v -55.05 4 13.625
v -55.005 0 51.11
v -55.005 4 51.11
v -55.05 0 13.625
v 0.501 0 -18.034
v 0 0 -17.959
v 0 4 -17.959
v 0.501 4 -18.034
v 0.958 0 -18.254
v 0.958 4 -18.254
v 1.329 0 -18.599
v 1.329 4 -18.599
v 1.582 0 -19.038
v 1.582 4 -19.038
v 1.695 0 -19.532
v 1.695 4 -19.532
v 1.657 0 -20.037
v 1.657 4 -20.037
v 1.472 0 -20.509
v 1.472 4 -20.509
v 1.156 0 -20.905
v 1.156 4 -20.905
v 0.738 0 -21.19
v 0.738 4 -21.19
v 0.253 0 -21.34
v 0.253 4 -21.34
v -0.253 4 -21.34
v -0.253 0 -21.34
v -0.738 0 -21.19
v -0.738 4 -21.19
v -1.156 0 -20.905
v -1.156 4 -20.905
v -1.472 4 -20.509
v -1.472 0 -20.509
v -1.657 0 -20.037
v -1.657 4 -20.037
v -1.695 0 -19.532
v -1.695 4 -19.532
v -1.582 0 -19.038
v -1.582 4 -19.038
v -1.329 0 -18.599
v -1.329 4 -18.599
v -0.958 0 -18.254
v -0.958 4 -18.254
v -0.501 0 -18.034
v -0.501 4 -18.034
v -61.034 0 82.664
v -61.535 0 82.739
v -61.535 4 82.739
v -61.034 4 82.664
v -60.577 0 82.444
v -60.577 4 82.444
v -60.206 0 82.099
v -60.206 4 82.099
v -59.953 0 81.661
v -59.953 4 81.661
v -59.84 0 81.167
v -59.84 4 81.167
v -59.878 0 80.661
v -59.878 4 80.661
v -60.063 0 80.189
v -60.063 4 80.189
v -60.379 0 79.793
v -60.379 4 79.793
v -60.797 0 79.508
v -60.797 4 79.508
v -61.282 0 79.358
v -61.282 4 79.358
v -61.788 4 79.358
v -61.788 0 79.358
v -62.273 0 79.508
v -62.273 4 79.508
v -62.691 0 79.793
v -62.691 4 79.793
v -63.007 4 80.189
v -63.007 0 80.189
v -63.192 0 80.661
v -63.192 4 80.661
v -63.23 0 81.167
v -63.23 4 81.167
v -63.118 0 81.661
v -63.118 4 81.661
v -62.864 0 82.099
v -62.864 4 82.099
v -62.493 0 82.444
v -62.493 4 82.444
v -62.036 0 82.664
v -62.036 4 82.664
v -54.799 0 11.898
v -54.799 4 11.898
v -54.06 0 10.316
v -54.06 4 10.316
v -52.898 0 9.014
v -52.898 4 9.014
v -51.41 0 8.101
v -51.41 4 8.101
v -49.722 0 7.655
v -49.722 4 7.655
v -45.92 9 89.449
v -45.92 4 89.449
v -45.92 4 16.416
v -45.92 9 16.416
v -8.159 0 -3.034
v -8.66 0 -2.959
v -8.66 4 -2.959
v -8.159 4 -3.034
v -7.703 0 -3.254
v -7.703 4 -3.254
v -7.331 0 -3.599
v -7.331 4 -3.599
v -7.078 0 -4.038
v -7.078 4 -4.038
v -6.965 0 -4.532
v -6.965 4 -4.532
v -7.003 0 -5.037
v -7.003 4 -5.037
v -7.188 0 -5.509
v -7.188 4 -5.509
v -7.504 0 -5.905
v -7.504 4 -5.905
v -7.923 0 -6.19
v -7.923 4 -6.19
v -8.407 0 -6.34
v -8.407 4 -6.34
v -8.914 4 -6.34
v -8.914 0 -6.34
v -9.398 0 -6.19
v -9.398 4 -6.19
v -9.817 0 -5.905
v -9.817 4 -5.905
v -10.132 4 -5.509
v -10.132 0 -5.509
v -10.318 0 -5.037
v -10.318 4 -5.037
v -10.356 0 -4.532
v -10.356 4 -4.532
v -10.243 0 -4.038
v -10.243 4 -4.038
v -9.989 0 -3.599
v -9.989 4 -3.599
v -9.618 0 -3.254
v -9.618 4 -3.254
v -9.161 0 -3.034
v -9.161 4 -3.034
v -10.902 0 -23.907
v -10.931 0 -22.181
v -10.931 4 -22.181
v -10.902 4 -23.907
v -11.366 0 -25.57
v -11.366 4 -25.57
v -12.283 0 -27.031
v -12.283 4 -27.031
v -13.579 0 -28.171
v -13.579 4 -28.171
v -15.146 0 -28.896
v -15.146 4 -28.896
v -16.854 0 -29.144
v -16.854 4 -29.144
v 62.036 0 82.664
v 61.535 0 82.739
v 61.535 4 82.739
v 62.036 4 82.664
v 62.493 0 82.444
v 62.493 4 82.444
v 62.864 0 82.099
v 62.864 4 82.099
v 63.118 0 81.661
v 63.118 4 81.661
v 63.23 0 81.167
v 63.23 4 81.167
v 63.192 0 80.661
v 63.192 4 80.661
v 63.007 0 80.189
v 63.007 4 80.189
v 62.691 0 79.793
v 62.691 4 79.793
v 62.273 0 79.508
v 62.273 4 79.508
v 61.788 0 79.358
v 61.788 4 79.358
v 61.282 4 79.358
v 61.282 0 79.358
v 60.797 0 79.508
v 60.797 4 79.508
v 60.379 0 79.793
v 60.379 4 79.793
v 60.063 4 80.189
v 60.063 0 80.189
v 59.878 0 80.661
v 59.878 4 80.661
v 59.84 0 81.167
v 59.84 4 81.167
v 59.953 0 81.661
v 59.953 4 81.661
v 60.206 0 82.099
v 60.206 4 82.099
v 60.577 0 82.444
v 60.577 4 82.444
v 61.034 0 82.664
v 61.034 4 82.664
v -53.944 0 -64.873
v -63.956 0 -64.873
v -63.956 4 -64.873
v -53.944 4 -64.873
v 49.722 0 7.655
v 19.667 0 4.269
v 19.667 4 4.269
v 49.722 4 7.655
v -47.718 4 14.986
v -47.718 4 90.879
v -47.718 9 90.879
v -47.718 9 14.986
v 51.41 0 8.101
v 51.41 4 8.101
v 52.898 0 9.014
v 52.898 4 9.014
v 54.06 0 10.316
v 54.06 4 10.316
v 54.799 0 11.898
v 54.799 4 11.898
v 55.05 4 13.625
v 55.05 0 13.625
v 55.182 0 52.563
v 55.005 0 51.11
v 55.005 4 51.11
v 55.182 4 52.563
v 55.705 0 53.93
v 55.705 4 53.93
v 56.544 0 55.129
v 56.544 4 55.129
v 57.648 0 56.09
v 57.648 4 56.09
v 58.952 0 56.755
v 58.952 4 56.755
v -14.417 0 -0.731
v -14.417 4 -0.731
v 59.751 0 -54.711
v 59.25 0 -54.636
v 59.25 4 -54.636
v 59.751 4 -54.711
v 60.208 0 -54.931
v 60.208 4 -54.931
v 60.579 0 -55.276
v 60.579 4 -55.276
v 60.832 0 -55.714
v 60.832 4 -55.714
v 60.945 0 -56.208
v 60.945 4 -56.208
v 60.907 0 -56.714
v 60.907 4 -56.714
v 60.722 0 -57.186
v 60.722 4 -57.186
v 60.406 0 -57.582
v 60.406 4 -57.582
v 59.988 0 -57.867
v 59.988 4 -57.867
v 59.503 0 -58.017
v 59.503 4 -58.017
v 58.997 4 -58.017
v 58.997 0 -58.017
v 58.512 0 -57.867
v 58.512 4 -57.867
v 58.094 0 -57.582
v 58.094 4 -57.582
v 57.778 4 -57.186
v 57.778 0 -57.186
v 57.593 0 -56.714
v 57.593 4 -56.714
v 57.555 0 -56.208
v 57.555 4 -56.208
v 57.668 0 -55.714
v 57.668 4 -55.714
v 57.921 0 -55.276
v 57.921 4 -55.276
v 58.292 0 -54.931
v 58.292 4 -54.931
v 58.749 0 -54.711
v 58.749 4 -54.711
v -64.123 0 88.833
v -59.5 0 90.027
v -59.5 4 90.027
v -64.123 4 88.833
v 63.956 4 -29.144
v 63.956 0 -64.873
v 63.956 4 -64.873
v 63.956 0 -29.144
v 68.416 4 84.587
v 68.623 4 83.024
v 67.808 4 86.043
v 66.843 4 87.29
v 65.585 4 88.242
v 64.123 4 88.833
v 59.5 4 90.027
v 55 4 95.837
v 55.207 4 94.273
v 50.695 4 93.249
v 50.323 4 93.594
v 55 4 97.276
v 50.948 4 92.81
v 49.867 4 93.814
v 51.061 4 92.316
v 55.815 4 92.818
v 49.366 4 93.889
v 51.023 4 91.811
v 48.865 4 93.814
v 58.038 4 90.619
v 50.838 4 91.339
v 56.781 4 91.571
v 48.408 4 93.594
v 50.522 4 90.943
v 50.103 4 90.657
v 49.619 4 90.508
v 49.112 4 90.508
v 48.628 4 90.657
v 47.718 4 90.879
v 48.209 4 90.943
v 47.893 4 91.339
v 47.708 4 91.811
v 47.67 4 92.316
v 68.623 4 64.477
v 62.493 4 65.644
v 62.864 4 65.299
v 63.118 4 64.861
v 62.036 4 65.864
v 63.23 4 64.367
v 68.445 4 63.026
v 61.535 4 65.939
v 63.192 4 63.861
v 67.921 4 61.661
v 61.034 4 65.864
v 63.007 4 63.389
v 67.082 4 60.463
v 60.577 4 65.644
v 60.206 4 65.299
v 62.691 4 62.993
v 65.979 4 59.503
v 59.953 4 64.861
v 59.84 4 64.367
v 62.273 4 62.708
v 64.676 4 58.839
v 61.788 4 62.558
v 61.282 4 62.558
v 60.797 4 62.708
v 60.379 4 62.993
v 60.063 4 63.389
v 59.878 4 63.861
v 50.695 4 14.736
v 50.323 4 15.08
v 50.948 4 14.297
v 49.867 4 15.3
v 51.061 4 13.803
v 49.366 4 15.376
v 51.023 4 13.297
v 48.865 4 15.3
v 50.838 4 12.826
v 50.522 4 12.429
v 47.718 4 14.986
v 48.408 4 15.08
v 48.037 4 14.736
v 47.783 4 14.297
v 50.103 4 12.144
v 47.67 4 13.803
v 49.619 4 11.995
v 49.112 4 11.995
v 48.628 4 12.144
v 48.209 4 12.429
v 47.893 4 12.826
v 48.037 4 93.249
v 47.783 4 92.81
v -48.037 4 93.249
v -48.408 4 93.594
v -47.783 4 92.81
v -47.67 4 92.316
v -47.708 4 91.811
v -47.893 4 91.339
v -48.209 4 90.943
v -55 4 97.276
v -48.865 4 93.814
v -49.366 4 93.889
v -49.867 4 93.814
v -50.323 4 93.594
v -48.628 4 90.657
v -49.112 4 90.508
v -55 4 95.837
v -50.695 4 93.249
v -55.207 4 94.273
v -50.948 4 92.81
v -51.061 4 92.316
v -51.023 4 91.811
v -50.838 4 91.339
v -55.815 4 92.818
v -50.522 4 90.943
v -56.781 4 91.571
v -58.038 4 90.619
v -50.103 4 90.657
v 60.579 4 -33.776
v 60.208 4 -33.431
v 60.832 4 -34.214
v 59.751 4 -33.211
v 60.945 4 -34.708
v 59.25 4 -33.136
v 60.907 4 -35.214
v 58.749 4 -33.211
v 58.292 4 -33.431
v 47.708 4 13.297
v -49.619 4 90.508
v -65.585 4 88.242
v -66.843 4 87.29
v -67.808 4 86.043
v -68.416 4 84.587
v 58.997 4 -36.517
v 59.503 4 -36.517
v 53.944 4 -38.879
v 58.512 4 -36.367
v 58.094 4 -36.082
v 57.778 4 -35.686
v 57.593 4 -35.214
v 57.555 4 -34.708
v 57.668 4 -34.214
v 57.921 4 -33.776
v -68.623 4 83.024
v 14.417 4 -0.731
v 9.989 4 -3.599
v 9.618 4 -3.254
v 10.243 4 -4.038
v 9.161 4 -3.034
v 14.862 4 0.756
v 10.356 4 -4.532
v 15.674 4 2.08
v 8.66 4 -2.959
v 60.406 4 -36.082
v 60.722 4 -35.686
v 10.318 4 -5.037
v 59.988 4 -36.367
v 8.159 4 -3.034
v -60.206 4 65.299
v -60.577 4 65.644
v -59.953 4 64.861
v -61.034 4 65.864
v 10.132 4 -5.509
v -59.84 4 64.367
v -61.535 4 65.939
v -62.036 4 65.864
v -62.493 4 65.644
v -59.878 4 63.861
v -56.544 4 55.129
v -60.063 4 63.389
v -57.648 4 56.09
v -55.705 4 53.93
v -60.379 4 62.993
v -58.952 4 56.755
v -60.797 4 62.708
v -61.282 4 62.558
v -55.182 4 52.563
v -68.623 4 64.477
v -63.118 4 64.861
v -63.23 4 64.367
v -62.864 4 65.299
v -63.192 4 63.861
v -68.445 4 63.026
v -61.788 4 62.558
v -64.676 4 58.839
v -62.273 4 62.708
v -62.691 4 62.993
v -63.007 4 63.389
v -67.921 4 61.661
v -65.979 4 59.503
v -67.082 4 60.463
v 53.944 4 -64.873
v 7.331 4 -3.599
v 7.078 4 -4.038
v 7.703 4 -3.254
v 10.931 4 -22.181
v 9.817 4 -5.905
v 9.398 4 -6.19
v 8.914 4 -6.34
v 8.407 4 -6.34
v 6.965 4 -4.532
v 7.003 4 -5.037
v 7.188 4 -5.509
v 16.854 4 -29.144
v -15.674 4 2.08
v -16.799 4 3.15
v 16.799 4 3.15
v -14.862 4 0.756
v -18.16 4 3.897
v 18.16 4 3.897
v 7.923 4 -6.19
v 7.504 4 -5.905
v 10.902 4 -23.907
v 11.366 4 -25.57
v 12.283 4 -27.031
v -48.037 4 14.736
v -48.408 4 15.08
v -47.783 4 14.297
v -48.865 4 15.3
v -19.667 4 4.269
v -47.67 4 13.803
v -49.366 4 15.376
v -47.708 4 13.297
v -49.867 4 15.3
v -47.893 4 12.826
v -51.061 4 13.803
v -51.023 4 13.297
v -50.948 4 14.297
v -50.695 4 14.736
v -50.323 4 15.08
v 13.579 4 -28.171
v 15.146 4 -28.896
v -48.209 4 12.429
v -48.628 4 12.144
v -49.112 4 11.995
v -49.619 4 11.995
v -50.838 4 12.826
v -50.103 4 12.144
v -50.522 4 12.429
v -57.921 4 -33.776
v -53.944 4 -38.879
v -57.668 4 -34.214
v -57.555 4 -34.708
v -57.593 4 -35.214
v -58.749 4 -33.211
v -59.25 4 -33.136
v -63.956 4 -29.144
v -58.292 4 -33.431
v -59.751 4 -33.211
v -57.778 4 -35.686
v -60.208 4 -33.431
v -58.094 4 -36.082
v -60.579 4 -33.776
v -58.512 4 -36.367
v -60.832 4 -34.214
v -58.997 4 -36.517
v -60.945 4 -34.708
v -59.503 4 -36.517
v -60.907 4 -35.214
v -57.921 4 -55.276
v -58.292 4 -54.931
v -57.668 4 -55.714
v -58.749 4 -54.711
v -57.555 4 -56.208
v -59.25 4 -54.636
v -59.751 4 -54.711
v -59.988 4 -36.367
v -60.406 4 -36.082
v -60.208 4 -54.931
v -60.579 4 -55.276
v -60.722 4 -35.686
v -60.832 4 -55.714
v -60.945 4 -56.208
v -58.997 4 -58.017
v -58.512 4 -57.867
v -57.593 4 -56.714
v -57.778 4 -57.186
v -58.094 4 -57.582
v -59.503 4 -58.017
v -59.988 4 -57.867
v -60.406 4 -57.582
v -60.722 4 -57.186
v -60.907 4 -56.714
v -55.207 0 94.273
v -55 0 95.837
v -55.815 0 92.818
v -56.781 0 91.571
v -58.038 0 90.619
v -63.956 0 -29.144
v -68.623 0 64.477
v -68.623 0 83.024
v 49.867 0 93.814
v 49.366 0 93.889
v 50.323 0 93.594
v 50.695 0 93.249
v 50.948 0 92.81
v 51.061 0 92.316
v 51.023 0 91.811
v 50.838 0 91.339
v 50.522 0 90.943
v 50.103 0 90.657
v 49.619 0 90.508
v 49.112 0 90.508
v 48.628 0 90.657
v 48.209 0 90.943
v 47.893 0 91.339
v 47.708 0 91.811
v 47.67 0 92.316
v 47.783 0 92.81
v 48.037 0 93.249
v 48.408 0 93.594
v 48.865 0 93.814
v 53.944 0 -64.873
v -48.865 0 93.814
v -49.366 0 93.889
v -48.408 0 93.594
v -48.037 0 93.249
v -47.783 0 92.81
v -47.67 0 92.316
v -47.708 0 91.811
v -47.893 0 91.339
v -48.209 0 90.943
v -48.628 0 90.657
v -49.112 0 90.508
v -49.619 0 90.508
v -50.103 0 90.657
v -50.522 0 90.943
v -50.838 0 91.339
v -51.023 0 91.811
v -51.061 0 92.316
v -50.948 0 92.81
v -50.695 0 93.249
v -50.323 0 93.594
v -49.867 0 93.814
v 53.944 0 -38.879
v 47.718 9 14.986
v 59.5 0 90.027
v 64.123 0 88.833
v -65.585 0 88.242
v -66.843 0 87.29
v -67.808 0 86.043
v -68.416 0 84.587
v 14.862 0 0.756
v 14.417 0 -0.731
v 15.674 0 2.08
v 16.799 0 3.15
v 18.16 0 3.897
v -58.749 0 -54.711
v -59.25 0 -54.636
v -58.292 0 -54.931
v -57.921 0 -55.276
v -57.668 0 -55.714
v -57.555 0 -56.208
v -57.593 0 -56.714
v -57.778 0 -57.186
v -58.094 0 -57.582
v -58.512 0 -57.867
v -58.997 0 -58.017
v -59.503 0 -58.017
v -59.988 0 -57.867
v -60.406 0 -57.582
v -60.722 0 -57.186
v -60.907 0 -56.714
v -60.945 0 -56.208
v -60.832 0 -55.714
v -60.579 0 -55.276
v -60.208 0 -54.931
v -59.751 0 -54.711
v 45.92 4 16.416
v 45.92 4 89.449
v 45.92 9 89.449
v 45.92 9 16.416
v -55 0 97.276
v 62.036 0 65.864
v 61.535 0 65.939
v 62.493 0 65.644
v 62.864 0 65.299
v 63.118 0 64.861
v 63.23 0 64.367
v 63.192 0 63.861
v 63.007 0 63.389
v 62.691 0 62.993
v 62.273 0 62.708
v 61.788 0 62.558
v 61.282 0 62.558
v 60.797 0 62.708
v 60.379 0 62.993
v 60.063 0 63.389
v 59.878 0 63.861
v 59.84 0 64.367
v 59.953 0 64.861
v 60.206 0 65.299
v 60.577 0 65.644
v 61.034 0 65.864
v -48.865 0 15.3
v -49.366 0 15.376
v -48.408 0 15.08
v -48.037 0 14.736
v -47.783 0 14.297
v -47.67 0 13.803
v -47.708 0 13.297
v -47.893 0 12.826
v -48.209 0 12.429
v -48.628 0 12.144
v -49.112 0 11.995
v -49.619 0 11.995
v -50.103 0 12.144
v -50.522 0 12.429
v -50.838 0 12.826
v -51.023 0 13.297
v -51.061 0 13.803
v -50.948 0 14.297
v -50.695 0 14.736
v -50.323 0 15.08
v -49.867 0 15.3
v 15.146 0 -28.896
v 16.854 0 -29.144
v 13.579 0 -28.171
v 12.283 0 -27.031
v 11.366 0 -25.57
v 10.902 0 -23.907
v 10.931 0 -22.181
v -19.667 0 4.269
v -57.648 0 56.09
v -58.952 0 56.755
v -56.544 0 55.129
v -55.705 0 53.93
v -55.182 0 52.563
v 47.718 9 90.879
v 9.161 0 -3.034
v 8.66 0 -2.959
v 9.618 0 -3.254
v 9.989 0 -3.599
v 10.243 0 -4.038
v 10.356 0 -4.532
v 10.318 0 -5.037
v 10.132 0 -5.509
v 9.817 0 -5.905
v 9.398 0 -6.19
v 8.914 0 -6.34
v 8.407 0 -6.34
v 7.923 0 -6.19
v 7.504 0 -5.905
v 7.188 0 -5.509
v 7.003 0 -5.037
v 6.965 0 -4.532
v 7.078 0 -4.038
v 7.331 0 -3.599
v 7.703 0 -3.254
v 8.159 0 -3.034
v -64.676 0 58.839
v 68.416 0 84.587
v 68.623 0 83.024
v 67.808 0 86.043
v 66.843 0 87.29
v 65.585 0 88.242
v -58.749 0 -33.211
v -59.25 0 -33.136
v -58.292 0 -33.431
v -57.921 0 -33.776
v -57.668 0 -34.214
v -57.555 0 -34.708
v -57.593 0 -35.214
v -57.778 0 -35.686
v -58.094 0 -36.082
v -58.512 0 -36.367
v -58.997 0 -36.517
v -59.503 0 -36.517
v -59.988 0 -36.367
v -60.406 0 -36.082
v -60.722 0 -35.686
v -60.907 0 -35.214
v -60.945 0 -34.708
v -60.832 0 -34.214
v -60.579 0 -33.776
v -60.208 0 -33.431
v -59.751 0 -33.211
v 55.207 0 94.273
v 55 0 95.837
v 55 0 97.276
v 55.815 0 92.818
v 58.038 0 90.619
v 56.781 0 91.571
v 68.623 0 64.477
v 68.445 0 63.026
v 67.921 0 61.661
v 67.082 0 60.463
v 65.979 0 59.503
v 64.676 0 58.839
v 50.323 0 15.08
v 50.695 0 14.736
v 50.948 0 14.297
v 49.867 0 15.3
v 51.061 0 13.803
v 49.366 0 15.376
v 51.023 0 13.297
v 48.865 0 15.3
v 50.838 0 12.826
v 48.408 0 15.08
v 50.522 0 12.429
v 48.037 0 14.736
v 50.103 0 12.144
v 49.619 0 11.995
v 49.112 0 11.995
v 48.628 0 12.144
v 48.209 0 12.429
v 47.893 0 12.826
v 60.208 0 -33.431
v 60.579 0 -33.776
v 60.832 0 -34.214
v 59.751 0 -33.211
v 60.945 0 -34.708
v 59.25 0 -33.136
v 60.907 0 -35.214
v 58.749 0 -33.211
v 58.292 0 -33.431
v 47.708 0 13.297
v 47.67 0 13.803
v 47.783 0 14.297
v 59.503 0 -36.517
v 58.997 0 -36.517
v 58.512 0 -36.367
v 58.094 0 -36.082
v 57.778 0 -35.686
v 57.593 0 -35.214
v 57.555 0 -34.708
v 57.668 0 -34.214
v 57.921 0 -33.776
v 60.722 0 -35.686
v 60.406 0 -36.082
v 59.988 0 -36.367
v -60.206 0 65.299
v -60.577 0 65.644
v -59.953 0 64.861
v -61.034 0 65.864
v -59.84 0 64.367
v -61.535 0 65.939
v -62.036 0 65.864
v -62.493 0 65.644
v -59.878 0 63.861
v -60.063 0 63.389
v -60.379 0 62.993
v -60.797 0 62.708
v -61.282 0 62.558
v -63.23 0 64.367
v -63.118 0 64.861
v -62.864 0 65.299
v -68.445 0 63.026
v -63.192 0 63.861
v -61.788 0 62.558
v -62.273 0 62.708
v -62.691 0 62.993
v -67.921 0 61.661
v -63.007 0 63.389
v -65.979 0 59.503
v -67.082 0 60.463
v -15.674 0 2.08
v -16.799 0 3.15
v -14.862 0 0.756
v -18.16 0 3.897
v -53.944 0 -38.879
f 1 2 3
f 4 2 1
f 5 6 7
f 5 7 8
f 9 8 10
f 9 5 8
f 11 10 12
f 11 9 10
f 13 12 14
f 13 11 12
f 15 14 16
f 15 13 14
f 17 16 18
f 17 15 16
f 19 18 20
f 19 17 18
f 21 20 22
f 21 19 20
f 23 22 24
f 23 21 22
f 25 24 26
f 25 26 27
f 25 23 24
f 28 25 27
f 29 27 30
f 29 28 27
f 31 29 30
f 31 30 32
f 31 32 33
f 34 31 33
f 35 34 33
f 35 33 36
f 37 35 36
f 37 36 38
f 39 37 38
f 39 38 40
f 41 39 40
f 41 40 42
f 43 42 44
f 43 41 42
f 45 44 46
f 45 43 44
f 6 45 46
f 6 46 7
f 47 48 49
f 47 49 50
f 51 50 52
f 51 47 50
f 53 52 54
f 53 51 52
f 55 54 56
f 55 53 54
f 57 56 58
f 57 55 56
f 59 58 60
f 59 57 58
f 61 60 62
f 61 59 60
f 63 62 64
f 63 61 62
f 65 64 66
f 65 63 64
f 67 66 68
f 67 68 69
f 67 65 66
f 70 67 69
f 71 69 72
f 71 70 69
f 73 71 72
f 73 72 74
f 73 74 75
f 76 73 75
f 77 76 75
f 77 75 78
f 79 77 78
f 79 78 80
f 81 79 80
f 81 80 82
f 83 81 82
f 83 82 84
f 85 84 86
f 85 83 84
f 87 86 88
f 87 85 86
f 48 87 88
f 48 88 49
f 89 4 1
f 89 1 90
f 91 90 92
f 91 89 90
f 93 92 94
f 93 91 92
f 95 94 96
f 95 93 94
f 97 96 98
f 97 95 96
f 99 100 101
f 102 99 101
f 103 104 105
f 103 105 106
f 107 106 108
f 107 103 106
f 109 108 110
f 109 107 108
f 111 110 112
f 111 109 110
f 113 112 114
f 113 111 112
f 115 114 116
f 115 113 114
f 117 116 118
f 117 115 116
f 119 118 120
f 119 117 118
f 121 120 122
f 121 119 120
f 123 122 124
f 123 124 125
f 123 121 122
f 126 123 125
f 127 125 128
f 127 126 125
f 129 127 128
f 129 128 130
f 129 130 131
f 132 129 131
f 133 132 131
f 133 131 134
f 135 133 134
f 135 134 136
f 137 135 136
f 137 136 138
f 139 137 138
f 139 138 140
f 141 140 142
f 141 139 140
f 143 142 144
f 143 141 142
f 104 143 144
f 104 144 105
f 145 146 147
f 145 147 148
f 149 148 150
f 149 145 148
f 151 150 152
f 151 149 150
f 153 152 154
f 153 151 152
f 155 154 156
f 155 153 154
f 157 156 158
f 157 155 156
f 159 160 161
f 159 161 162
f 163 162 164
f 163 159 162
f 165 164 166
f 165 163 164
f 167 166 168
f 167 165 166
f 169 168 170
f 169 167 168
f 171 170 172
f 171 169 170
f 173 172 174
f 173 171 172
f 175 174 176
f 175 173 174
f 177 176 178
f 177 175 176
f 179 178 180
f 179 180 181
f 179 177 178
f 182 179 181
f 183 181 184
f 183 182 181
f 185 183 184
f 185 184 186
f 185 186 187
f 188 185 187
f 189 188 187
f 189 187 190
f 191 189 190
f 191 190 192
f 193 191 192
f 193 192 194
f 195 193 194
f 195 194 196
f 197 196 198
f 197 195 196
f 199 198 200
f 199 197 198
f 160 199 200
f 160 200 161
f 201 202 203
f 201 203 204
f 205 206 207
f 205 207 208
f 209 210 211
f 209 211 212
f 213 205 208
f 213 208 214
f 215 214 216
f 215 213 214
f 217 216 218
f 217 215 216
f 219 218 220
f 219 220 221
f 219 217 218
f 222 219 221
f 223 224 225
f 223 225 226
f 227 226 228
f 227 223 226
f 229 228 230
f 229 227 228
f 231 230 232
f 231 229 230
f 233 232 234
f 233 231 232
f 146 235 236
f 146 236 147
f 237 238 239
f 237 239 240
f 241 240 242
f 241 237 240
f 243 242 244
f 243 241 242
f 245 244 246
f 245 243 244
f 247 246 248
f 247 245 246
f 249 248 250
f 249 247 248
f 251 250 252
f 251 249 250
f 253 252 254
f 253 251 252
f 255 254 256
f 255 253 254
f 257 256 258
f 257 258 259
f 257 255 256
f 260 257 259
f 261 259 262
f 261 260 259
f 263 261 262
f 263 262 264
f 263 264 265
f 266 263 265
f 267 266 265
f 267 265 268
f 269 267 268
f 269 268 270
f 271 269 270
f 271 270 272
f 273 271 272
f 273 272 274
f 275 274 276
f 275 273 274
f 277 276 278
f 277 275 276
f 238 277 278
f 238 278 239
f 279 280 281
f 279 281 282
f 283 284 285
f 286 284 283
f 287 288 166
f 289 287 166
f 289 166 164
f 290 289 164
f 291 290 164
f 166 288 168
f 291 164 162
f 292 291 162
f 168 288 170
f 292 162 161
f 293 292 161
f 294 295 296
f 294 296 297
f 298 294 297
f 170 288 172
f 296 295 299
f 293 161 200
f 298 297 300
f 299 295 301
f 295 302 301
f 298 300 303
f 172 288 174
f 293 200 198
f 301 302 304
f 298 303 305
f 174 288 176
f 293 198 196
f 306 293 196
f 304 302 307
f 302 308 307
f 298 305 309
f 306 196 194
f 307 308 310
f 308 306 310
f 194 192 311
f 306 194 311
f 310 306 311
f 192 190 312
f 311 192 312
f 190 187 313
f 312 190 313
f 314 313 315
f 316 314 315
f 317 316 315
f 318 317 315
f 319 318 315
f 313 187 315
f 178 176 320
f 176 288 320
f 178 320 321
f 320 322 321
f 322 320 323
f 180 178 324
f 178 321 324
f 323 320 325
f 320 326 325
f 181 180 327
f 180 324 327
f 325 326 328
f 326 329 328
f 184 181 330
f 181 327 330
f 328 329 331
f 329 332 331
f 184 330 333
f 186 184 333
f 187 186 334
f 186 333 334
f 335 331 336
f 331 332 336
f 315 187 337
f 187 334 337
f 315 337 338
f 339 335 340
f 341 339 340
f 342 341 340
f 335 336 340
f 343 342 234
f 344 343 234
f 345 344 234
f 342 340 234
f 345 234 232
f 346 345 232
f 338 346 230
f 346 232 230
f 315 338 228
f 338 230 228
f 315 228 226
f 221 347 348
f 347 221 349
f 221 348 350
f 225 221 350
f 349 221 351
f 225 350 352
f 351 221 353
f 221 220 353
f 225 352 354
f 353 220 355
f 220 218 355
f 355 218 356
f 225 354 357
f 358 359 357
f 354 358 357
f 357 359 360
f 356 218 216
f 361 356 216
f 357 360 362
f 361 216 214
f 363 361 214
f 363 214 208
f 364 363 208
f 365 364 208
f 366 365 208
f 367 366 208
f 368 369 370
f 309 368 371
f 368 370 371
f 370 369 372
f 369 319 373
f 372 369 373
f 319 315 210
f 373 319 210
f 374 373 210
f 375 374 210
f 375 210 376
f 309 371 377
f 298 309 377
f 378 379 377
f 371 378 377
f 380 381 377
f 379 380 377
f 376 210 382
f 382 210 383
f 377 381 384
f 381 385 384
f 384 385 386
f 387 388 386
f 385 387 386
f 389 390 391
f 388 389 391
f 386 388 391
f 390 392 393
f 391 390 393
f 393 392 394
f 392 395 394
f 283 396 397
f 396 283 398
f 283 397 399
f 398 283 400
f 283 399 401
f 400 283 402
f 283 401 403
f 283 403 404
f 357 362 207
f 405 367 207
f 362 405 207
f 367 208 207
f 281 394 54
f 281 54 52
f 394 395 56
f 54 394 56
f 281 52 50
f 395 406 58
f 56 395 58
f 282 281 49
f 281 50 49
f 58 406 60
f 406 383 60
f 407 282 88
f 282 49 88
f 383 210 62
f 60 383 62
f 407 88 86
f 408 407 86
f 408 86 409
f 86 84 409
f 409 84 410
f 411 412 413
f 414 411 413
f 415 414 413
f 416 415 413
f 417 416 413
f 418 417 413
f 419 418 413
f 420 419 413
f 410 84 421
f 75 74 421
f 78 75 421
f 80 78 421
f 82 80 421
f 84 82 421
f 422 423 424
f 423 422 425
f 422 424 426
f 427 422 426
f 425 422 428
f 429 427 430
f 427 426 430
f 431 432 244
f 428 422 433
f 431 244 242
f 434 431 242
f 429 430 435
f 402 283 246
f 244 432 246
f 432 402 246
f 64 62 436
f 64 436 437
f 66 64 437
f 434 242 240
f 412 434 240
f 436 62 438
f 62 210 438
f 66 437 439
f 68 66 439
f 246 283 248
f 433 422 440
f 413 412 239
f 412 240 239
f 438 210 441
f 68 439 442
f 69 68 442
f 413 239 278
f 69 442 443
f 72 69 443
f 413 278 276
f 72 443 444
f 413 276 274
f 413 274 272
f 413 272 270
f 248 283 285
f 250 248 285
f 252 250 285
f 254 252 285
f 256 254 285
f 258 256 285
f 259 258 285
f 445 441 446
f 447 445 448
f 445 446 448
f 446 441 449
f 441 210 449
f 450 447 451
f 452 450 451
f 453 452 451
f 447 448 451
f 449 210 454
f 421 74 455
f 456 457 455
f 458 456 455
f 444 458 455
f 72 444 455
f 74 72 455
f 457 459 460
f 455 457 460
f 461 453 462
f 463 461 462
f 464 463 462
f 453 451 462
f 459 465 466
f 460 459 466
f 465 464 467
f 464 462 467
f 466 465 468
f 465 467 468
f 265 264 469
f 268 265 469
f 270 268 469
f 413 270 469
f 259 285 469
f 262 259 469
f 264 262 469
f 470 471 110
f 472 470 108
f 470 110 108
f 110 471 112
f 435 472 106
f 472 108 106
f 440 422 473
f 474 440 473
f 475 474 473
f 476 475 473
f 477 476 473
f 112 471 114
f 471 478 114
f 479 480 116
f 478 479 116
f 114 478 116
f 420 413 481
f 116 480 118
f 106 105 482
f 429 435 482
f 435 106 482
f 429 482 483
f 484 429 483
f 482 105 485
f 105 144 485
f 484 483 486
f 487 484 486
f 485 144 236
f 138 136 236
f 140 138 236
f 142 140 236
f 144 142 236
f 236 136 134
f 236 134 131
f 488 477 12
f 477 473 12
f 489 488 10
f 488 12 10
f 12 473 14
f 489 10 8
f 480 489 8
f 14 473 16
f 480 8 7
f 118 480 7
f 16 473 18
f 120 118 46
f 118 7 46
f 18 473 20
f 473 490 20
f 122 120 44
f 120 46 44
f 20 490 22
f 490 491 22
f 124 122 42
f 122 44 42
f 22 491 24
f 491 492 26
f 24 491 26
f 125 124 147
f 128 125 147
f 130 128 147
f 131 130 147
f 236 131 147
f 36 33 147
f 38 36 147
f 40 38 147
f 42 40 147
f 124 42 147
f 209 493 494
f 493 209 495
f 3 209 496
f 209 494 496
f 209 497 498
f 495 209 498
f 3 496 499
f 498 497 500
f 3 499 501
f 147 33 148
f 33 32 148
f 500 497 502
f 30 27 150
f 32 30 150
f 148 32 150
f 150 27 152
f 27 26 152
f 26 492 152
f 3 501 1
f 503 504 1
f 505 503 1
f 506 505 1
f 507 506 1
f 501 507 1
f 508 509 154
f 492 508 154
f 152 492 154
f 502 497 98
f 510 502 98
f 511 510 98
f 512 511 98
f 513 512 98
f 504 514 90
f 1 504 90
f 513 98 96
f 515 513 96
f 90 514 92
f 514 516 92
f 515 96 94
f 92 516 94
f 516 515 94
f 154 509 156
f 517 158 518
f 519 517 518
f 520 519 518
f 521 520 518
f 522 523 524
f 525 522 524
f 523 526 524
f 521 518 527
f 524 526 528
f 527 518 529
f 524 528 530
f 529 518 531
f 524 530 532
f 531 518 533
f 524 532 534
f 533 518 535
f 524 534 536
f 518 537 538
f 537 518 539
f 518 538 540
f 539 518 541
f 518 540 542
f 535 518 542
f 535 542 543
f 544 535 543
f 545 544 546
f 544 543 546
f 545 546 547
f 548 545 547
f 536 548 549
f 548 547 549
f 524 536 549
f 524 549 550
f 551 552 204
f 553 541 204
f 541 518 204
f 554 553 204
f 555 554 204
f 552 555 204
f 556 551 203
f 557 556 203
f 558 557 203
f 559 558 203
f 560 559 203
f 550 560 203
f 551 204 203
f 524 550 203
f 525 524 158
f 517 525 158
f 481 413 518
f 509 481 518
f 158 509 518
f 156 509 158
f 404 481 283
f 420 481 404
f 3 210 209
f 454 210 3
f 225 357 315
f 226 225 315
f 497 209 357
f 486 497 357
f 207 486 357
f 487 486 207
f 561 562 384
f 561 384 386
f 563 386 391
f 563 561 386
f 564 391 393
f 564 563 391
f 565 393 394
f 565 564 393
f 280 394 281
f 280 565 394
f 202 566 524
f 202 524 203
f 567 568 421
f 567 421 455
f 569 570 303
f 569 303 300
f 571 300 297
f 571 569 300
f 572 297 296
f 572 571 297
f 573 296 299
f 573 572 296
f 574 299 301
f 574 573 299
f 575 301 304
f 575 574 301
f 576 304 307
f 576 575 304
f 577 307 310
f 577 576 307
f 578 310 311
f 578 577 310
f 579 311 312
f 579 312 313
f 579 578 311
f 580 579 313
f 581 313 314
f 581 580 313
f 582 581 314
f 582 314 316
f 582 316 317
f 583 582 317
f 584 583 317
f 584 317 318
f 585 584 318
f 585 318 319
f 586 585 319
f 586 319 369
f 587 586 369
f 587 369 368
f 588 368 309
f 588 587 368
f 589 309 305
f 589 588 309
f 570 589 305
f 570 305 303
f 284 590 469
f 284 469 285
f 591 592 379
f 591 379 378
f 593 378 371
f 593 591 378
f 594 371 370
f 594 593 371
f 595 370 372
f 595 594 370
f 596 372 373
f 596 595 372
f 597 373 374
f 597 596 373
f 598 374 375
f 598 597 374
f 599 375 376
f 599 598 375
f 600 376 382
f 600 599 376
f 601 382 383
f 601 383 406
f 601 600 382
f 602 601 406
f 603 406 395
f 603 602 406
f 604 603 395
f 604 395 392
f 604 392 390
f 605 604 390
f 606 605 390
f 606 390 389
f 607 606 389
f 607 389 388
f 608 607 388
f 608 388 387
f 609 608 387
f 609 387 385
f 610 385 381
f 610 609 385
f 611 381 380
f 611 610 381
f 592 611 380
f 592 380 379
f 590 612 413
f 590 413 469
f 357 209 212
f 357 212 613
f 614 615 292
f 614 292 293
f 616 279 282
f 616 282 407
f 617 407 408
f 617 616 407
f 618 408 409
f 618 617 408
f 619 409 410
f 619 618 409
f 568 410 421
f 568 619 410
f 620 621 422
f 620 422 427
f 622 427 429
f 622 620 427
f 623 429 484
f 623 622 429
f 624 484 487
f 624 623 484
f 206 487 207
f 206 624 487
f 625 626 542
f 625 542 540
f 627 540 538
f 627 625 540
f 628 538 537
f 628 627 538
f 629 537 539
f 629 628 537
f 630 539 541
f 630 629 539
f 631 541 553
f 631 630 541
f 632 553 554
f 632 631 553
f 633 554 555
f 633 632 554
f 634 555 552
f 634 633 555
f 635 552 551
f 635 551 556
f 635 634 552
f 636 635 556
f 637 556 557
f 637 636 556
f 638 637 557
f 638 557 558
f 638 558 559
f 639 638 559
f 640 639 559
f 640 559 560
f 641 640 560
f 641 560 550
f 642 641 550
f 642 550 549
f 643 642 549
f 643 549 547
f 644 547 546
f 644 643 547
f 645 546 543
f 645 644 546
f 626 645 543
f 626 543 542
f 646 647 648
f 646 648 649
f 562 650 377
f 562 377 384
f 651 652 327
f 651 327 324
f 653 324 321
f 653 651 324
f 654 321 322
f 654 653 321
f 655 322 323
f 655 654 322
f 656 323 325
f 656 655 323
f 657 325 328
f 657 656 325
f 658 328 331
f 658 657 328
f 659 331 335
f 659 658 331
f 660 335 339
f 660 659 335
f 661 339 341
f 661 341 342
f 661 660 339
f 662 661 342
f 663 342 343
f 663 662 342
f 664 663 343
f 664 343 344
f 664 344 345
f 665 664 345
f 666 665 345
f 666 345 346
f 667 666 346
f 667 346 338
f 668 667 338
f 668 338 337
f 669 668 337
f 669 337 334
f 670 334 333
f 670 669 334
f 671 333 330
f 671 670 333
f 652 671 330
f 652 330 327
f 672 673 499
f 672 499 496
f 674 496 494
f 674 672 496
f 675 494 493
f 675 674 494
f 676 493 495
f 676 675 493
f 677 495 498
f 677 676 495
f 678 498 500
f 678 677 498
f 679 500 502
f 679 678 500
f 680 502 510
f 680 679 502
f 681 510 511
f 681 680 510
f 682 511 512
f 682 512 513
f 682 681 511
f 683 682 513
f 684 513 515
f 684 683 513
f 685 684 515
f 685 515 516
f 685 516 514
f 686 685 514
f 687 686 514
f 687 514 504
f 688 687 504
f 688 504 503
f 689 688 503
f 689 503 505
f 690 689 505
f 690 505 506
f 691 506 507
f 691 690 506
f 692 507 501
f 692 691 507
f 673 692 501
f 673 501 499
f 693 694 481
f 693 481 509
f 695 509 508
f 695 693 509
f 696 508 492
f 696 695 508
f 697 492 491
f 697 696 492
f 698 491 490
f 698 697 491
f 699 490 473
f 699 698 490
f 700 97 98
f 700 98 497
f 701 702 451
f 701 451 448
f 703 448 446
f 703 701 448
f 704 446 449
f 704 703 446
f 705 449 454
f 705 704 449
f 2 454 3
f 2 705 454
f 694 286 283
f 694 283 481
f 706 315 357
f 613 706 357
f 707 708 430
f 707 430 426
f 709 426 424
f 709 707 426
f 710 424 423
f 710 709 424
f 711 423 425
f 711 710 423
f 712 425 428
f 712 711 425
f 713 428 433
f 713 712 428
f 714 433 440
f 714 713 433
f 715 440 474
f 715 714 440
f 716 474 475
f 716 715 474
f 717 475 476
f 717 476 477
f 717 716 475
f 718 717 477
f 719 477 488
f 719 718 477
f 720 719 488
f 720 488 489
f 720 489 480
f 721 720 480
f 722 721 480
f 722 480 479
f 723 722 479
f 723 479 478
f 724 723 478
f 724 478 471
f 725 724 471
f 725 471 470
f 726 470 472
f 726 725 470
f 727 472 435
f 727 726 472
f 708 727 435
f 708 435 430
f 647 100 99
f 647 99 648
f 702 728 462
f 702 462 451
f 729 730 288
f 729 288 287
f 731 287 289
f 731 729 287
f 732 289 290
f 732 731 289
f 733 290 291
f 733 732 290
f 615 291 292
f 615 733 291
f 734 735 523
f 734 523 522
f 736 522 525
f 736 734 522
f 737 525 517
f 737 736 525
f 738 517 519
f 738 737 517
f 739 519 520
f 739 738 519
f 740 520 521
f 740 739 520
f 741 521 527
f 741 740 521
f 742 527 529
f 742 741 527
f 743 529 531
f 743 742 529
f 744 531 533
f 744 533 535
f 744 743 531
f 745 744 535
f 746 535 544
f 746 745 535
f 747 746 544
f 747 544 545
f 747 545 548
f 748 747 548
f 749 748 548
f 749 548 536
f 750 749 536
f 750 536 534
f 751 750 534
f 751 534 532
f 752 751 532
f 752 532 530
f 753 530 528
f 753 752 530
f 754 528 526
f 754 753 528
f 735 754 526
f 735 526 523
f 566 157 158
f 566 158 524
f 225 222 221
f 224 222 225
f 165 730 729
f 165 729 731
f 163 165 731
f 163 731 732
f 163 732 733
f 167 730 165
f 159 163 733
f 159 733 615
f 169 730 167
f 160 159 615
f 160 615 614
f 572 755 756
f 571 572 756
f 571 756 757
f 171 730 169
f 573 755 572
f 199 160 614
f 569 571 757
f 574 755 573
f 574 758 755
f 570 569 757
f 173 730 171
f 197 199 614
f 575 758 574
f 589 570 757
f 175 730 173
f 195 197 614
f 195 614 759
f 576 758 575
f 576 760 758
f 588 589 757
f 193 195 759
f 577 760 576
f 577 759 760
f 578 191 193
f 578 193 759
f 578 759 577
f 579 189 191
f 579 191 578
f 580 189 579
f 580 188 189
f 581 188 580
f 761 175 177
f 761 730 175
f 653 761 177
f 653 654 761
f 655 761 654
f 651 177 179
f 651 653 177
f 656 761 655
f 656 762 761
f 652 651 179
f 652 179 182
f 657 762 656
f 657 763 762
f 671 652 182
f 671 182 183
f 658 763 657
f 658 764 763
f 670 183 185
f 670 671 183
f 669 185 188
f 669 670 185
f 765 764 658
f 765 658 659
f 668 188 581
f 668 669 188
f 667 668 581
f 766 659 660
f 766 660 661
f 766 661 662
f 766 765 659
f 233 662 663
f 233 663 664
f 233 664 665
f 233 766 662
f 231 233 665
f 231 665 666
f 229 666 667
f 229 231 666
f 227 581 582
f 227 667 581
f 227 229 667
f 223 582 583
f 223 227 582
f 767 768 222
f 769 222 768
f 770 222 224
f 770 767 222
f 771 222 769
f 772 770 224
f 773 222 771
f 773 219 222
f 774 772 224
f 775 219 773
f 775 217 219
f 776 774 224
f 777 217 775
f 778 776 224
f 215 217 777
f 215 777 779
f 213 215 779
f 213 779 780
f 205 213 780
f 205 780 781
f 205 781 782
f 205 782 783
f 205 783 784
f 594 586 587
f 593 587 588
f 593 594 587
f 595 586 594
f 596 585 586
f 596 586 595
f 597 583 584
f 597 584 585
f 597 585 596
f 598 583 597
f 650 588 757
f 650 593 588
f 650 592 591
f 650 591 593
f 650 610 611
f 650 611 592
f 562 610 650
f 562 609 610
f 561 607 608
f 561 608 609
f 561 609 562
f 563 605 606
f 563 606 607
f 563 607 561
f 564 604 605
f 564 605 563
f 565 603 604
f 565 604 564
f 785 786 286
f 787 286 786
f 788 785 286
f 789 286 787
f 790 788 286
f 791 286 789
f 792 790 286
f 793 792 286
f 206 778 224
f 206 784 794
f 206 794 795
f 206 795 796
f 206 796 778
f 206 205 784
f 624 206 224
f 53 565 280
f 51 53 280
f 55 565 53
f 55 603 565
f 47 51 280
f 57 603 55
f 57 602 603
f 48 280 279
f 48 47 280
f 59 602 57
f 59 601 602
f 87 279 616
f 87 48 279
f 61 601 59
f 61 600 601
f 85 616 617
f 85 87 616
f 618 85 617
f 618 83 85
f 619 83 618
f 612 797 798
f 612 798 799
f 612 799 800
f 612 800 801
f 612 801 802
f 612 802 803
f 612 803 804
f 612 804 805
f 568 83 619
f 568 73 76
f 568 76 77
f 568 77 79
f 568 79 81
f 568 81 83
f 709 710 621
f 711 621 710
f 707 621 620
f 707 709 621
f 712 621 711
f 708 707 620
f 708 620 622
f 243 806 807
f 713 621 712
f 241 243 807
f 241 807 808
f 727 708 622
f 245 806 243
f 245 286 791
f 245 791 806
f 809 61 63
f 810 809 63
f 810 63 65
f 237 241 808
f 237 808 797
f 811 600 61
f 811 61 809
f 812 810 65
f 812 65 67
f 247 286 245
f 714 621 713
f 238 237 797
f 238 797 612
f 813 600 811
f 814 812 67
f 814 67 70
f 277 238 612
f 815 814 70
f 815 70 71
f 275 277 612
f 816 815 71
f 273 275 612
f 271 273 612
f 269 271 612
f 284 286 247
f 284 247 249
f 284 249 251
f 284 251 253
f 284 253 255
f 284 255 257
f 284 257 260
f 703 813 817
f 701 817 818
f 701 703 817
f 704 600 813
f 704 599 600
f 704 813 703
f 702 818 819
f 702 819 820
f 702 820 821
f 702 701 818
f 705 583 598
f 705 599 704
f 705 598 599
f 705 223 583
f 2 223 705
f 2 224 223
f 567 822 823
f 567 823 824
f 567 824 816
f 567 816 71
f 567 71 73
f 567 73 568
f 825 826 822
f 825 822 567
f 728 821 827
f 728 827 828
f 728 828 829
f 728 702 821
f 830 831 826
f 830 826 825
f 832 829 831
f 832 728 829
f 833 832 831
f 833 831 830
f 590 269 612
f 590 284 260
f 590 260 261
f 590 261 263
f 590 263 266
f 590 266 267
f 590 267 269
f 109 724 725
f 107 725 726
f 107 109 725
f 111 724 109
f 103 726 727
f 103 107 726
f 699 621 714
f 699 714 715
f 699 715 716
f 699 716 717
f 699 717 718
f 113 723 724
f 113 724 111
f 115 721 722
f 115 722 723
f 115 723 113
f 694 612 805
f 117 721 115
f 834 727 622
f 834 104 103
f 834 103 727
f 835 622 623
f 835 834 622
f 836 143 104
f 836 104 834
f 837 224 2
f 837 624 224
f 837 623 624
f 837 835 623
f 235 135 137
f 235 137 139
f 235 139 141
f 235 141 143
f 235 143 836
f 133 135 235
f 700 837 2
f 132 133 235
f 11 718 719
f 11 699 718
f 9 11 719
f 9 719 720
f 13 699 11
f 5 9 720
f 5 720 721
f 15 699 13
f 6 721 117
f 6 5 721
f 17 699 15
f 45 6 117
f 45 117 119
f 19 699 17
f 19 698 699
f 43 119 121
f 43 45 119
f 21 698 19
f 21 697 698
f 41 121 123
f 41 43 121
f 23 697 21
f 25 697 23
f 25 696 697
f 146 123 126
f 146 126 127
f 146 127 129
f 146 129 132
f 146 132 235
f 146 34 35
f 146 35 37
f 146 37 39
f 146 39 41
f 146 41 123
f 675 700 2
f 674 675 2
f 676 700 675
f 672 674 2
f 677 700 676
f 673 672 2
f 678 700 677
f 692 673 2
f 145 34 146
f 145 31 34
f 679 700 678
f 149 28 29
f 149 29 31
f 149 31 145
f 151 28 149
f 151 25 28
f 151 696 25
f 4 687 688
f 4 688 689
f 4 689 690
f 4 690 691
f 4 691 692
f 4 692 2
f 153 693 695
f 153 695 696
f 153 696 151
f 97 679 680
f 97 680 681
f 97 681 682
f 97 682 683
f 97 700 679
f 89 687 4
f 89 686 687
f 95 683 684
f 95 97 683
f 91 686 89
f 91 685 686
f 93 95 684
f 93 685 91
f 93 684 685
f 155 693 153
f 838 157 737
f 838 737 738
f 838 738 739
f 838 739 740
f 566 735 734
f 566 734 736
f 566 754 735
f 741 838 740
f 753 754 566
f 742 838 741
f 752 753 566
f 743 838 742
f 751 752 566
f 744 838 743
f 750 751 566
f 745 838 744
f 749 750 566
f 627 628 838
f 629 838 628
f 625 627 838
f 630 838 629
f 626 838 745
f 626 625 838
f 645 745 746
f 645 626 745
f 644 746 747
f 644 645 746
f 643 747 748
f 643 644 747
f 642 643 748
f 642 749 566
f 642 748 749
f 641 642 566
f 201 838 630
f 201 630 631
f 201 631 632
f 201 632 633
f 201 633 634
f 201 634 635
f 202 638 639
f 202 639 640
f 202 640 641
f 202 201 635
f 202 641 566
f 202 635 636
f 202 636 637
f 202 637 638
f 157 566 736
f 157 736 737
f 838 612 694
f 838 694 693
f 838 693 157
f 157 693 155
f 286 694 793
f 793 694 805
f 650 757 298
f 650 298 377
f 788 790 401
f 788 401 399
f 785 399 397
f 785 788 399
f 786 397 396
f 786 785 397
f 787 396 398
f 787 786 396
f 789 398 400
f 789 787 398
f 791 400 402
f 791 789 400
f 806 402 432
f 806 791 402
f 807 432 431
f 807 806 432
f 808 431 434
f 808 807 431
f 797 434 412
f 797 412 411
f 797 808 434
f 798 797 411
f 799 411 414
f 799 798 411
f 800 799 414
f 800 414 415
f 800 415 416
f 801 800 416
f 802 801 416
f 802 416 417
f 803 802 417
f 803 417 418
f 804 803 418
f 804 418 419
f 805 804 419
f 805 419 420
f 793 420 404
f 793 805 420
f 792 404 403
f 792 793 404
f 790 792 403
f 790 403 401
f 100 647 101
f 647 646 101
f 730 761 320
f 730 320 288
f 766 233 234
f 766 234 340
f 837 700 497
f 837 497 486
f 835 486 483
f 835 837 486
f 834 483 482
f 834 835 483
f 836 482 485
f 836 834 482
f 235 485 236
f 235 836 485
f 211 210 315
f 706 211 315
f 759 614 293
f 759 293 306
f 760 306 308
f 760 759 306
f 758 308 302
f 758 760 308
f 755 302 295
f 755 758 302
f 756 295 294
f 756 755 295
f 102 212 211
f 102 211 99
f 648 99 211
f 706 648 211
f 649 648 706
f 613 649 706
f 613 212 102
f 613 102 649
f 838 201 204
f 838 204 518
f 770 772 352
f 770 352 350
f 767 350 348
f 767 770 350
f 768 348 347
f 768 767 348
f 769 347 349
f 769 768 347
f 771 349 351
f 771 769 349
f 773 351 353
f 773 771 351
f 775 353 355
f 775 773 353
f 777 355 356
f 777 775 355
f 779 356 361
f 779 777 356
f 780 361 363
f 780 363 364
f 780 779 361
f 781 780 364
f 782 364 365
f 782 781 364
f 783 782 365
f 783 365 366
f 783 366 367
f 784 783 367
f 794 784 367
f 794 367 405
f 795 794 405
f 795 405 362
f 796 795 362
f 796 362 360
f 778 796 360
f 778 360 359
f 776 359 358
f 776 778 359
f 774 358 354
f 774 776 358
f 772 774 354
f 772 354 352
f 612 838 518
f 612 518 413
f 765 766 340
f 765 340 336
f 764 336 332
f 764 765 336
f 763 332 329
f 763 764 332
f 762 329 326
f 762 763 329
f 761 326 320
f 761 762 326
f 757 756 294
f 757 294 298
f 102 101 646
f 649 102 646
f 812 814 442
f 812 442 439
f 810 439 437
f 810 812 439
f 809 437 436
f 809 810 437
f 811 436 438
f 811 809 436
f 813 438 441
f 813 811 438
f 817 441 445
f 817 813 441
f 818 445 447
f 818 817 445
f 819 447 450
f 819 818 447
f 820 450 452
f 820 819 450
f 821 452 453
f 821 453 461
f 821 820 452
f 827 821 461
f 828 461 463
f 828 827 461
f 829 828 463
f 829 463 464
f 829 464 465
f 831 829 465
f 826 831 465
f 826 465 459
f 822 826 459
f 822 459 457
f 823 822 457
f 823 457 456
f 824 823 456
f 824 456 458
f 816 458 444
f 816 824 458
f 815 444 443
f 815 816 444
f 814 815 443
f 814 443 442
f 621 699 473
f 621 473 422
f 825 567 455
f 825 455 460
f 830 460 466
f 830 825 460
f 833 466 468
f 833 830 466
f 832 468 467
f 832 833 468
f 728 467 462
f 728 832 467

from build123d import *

# Parameters (mm, degrees)
SKETCH1_R           = 1.7
BOSS_EXTRUDE2_DEPTH = 4
SKETCH4_W           = 95.436014614
SKETCH4_H           = 75.892817578
SKETCH4_W_2         = 91.839367952
SKETCH4_H_2         = 73.032685056
BOSS_EXTRUDE5_DEPTH = 5


with BuildPart() as part:
    # Sketch1 → Boss-Extrude2 (new body)
    with BuildSketch(Plane(origin=(0, 0, 0), x_dir=(1, 0, 0), z_dir=(0, 1, 0))):
        with BuildLine():
            Line((55, -97.276480298), (-55, -97.276480298))
            Line((-55, -97.276480298), (-55, -95.836582418))
            ThreePointArc((-55, -95.836582418), (-56.256563164, -92.16237407), (-59.499935661, -90.027124011))
            Line((-59.499935661, -90.027124011), (-64.123335896, -88.833312587))
            ThreePointArc((-64.123335896, -88.833312587), (-67.366708393, -86.698062528), (-68.623271557, -83.02385418))
            Line((-68.623271557, -83.02385418), (-68.623271557, -64.477065442))
            ThreePointArc((-68.623271557, -64.477065442), (-67.538437873, -61.035969674), (-64.676224862, -58.839212772))
            Line((-64.676224862, -58.839212772), (-58.952120675, -56.75485206))
            ThreePointArc((-58.952120675, -56.75485206), (-56.08783115, -54.555127217), (-55.005078353, -51.109754923))
            Line((-55.005078353, -51.109754923), (-55.050338054, -13.624867313))
            ThreePointArc((-55.050338054, -13.624867313), (-53.526628764, -9.622267963), (-49.722190465, -7.65535648))
            Line((-49.722190465, -7.65535648), (-19.667476765, -4.268691216))
            ThreePointArc((-19.667476765, -4.268691216), (-16.201629955, -2.651477365), (-14.417006114, 0.731212762))
            Line((-14.417006114, 0.731212762), (-10.931405786, 22.181381875))
            ThreePointArc((-10.931405786, 22.181381875), (-12.283485184, 27.031277264), (-16.853724474, 29.143744262))
            Line((-16.853724474, 29.143744262), (-63.956383701, 29.143744262))
            Line((-63.956383701, 29.143744262), (-63.956383701, 64.872936213))
            Line((-63.956383701, 64.872936213), (-53.943716214, 64.872936213))
            Line((-53.943716214, 64.872936213), (-53.943716214, 38.878522988))
            Line((-53.943716214, 38.878522988), (53.943716214, 38.878522988))
            Line((53.943716214, 38.878522988), (53.943716214, 64.872936213))
            Line((53.943716214, 64.872936213), (63.956383701, 64.872936213))
            Line((63.956383701, 64.872936213), (63.956383701, 29.143744262))
            Line((63.956383701, 29.143744262), (16.853724474, 29.143744262))
            ThreePointArc((16.853724474, 29.143744262), (12.283485184, 27.031277264), (10.931405786, 22.181381875))
            Line((10.931405786, 22.181381875), (14.417006114, 0.731212762))
            ThreePointArc((14.417006114, 0.731212762), (16.201629955, -2.651477365), (19.667476765, -4.268691216))
            Line((19.667476765, -4.268691216), (49.722190465, -7.65535648))
            ThreePointArc((49.722190465, -7.65535648), (53.526628764, -9.622267963), (55.050338054, -13.624867313))
            Line((55.050338054, -13.624867313), (55.005078353, -51.109754923))
            ThreePointArc((55.005078353, -51.109754923), (56.08783115, -54.555127217), (58.952120675, -56.75485206))
            Line((58.952120675, -56.75485206), (64.676224862, -58.839212772))
            ThreePointArc((64.676224862, -58.839212772), (67.538437873, -61.035969674), (68.623271557, -64.477065442))
            Line((68.623271557, -64.477065442), (68.623271557, -83.02385418))
            ThreePointArc((68.623271557, -83.02385418), (67.366708393, -86.698062528), (64.123335896, -88.833312587))
            Line((64.123335896, -88.833312587), (59.499935661, -90.027124011))
            ThreePointArc((59.499935661, -90.027124011), (56.256563164, -92.16237407), (55, -95.836582418))
            Line((55, -95.836582418), (55, -97.276480298))
        make_face()
        with Locations(Location((-59.25, 56.33553485, 0), (0, 0, 270))):
            Circle(SKETCH1_R, mode=Mode.SUBTRACT)
        with Locations(Location((-59.25, 34.83553485, 0), (0, 0, 270))):
            Circle(SKETCH1_R, mode=Mode.SUBTRACT)
        with Locations(Location((59.25, 34.83553485, 0), (0, 0, 270))):
            Circle(SKETCH1_R, mode=Mode.SUBTRACT)
        with Locations(Location((59.25, 56.33553485, 0), (0, 0, 270))):
            Circle(SKETCH1_R, mode=Mode.SUBTRACT)
        with Locations(Location((0, 19.658684952, 0), (0, 0, 270))):
            Circle(SKETCH1_R, mode=Mode.SUBTRACT)
        with Locations(Location((61.535021632, -64.239476302, 0), (0, 0, 270))):
            Circle(SKETCH1_R, mode=Mode.SUBTRACT)
        with Locations(Location((-8.660254038, 4.658684952, 0), (0, 0, 270))):
            Circle(SKETCH1_R, mode=Mode.SUBTRACT)
        with Locations(Location((8.660254038, 4.658684952, 0), (0, 0, 270))):
            Circle(SKETCH1_R, mode=Mode.SUBTRACT)
        with Locations(Location((61.535021632, -81.039476302, 0), (0, 0, 270))):
            Circle(SKETCH1_R, mode=Mode.SUBTRACT)
        with Locations(Location((-61.535021632, -81.039476302, 0), (0, 0, 270))):
            Circle(SKETCH1_R, mode=Mode.SUBTRACT)
        with Locations(Location((-61.535021632, -64.239476302, 0), (0, 0, 270))):
            Circle(SKETCH1_R, mode=Mode.SUBTRACT)
        with Locations(Location((-49.365711, -13.675658, 0), (0, 0, 270))):
            Circle(SKETCH1_R, mode=Mode.SUBTRACT)
        with Locations(Location((-49.365711, -92.189056, 0), (0, 0, 270))):
            Circle(SKETCH1_R, mode=Mode.SUBTRACT)
        with Locations(Location((49.365711, -92.189056, 0), (0, 0, 270))):
            Circle(SKETCH1_R, mode=Mode.SUBTRACT)
        with Locations(Location((49.365711, -13.675658, 0), (0, 0, 270))):
            Circle(SKETCH1_R, mode=Mode.SUBTRACT)
    extrude(amount=BOSS_EXTRUDE2_DEPTH)

    # Sketch4 → Boss-Extrude5 (add)
    with BuildSketch(Plane(origin=(0, 4, 0), x_dir=(1, 0, 0), z_dir=(0, 1, 0))):
        with Locations((0, -52.932357)):
            Rectangle(SKETCH4_W, SKETCH4_H)
        with Locations((0, -52.932357)):
            Rectangle(SKETCH4_W_2, SKETCH4_H_2, mode=Mode.SUBTRACT)
    extrude(amount=BOSS_EXTRUDE5_DEPTH)


solid = part.part
